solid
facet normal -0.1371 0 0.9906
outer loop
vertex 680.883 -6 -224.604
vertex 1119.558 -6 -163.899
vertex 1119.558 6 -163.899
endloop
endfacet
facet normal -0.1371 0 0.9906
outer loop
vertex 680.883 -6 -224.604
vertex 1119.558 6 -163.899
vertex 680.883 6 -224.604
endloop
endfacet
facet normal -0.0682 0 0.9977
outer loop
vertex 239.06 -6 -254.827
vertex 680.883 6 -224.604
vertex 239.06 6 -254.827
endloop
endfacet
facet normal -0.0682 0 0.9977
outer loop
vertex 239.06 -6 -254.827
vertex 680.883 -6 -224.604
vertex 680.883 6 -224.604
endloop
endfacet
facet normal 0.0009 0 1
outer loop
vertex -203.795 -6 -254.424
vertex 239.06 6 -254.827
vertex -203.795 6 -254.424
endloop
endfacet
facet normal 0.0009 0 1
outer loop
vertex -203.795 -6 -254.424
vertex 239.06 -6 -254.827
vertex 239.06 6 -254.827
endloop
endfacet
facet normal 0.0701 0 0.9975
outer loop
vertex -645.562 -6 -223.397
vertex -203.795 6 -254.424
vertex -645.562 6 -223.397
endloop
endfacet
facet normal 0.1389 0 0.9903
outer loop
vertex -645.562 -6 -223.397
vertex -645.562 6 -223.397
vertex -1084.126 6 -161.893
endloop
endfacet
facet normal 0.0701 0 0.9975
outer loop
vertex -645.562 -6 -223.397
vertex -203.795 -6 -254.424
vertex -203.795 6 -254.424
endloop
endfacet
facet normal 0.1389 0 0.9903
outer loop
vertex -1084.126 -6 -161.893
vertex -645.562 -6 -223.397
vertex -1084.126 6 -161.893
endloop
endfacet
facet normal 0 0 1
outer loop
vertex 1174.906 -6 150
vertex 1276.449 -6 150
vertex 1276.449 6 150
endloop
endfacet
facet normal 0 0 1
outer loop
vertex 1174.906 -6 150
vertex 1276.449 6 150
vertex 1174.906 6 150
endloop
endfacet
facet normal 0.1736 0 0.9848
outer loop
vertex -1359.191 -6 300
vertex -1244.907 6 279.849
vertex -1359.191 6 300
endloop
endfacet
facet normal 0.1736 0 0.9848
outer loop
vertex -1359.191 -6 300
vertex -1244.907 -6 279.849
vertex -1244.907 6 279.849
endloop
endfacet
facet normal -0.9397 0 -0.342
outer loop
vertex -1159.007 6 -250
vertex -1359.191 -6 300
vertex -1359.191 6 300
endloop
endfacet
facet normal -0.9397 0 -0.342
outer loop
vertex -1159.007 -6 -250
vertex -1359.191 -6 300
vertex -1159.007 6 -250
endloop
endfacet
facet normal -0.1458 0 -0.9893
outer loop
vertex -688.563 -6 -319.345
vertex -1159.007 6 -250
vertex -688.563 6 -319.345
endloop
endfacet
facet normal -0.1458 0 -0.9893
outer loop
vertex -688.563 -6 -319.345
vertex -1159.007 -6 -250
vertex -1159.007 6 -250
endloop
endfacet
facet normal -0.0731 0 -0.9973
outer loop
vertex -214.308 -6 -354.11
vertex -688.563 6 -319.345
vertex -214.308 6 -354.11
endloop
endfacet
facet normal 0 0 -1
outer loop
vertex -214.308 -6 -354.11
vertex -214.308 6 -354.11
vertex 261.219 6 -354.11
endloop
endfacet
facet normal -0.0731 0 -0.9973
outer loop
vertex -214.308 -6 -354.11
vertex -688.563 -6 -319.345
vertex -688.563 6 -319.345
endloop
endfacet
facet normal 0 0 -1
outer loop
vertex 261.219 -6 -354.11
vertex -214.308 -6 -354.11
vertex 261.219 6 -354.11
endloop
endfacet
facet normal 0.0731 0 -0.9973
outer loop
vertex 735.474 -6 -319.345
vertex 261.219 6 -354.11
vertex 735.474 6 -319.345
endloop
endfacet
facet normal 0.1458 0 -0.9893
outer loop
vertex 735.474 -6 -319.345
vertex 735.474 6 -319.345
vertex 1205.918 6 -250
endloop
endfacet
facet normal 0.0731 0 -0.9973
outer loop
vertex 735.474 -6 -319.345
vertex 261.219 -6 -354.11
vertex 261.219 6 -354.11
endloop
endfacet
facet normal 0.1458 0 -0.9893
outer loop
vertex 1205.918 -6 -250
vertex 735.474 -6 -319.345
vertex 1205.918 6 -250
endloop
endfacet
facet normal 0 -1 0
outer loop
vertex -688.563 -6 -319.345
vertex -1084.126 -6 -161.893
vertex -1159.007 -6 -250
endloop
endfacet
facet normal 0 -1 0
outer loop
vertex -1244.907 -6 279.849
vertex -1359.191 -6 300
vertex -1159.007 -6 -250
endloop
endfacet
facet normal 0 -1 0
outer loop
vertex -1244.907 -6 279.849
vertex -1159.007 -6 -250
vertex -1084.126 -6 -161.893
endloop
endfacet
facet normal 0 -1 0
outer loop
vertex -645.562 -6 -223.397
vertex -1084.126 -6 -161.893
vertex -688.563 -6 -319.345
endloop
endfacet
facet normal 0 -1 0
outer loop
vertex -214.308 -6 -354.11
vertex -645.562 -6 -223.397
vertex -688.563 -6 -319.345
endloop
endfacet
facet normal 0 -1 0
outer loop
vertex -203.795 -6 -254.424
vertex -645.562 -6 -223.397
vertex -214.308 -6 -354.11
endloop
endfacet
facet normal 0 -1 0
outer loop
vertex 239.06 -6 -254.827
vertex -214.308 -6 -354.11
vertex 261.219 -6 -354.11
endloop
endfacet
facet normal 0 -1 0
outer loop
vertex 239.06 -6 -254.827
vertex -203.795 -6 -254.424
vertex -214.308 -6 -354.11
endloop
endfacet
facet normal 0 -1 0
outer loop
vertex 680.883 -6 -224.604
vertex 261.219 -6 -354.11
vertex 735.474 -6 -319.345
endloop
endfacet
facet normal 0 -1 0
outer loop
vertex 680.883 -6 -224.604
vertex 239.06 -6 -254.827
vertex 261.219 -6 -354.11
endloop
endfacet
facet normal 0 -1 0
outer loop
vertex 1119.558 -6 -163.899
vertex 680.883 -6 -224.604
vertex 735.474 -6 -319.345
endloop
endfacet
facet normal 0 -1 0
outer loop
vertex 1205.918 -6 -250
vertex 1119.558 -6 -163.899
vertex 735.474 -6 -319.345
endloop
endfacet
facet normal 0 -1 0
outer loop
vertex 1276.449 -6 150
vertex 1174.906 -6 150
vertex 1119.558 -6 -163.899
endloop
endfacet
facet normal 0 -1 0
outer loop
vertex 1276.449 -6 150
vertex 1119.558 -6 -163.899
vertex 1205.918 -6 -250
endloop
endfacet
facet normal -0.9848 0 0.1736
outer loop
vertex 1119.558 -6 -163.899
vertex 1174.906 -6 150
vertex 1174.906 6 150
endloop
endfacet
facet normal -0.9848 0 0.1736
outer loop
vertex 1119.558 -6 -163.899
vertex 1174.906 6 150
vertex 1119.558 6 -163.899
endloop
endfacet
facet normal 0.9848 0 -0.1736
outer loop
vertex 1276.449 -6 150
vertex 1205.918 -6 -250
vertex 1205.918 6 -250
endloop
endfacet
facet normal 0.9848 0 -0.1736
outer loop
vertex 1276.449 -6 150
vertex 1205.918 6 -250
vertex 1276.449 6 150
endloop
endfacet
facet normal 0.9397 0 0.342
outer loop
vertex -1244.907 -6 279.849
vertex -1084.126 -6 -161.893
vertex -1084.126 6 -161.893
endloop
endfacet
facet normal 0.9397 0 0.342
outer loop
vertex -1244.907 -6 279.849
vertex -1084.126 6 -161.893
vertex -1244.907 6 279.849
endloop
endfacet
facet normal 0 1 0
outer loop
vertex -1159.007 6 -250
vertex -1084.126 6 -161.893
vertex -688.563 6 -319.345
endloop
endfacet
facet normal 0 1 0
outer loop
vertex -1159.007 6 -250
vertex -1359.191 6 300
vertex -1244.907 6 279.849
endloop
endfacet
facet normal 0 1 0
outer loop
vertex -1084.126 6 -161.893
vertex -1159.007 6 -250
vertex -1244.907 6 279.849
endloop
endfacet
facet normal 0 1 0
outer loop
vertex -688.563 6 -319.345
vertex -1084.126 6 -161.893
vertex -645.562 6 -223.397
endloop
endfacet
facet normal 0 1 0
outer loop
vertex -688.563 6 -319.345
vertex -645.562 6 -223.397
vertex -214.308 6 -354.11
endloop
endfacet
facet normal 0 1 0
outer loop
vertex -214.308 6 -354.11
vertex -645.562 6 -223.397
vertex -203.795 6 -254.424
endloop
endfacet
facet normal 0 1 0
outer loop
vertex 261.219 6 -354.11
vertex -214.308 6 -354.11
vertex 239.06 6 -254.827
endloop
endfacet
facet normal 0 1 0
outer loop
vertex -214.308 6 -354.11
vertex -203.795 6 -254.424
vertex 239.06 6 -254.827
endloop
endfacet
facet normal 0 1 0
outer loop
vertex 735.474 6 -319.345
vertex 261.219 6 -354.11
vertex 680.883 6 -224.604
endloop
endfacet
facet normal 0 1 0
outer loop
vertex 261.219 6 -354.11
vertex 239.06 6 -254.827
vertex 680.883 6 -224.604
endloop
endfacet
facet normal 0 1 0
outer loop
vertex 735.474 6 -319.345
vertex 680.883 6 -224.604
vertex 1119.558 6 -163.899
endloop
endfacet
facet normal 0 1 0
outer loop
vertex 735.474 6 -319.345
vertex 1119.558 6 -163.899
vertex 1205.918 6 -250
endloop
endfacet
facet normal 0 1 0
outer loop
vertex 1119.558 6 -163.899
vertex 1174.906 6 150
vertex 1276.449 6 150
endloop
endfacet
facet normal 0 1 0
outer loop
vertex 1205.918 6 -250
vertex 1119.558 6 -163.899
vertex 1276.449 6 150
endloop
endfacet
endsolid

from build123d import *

# Parameters (mm, degrees)
F2_DEPTH = 6


with BuildPart() as f2:
    # F1 (on Front) → F2 (new body, symmetric)
    with BuildSketch(Plane.XZ):
        with BuildLine():
            Line((-1084.126008, -161.892822), (-1159.007441, -250))
            ThreePointArc((-1159.007441, -250), (23.455407, -358.460153), (1205.918255, -250))
            Line((1205.918255, -250), (1119.557507, -163.89909))
            ThreePointArc((1119.557507, -163.89909), (17.628749, -258.457501), (-1084.126008, -161.892822))
        make_face()
        Polygon((-1244.906732, 279.848588), (-1359.19107, 300), (-1159.007441, -250), (-1084.126008, -161.892822), align=None)
        Polygon((1119.557507, -163.89909), (1205.918255, -250), (1276.449047, 150), (1174.906386, 150), align=None)
    extrude(amount=F2_DEPTH, both=True)


solid = f2.part
